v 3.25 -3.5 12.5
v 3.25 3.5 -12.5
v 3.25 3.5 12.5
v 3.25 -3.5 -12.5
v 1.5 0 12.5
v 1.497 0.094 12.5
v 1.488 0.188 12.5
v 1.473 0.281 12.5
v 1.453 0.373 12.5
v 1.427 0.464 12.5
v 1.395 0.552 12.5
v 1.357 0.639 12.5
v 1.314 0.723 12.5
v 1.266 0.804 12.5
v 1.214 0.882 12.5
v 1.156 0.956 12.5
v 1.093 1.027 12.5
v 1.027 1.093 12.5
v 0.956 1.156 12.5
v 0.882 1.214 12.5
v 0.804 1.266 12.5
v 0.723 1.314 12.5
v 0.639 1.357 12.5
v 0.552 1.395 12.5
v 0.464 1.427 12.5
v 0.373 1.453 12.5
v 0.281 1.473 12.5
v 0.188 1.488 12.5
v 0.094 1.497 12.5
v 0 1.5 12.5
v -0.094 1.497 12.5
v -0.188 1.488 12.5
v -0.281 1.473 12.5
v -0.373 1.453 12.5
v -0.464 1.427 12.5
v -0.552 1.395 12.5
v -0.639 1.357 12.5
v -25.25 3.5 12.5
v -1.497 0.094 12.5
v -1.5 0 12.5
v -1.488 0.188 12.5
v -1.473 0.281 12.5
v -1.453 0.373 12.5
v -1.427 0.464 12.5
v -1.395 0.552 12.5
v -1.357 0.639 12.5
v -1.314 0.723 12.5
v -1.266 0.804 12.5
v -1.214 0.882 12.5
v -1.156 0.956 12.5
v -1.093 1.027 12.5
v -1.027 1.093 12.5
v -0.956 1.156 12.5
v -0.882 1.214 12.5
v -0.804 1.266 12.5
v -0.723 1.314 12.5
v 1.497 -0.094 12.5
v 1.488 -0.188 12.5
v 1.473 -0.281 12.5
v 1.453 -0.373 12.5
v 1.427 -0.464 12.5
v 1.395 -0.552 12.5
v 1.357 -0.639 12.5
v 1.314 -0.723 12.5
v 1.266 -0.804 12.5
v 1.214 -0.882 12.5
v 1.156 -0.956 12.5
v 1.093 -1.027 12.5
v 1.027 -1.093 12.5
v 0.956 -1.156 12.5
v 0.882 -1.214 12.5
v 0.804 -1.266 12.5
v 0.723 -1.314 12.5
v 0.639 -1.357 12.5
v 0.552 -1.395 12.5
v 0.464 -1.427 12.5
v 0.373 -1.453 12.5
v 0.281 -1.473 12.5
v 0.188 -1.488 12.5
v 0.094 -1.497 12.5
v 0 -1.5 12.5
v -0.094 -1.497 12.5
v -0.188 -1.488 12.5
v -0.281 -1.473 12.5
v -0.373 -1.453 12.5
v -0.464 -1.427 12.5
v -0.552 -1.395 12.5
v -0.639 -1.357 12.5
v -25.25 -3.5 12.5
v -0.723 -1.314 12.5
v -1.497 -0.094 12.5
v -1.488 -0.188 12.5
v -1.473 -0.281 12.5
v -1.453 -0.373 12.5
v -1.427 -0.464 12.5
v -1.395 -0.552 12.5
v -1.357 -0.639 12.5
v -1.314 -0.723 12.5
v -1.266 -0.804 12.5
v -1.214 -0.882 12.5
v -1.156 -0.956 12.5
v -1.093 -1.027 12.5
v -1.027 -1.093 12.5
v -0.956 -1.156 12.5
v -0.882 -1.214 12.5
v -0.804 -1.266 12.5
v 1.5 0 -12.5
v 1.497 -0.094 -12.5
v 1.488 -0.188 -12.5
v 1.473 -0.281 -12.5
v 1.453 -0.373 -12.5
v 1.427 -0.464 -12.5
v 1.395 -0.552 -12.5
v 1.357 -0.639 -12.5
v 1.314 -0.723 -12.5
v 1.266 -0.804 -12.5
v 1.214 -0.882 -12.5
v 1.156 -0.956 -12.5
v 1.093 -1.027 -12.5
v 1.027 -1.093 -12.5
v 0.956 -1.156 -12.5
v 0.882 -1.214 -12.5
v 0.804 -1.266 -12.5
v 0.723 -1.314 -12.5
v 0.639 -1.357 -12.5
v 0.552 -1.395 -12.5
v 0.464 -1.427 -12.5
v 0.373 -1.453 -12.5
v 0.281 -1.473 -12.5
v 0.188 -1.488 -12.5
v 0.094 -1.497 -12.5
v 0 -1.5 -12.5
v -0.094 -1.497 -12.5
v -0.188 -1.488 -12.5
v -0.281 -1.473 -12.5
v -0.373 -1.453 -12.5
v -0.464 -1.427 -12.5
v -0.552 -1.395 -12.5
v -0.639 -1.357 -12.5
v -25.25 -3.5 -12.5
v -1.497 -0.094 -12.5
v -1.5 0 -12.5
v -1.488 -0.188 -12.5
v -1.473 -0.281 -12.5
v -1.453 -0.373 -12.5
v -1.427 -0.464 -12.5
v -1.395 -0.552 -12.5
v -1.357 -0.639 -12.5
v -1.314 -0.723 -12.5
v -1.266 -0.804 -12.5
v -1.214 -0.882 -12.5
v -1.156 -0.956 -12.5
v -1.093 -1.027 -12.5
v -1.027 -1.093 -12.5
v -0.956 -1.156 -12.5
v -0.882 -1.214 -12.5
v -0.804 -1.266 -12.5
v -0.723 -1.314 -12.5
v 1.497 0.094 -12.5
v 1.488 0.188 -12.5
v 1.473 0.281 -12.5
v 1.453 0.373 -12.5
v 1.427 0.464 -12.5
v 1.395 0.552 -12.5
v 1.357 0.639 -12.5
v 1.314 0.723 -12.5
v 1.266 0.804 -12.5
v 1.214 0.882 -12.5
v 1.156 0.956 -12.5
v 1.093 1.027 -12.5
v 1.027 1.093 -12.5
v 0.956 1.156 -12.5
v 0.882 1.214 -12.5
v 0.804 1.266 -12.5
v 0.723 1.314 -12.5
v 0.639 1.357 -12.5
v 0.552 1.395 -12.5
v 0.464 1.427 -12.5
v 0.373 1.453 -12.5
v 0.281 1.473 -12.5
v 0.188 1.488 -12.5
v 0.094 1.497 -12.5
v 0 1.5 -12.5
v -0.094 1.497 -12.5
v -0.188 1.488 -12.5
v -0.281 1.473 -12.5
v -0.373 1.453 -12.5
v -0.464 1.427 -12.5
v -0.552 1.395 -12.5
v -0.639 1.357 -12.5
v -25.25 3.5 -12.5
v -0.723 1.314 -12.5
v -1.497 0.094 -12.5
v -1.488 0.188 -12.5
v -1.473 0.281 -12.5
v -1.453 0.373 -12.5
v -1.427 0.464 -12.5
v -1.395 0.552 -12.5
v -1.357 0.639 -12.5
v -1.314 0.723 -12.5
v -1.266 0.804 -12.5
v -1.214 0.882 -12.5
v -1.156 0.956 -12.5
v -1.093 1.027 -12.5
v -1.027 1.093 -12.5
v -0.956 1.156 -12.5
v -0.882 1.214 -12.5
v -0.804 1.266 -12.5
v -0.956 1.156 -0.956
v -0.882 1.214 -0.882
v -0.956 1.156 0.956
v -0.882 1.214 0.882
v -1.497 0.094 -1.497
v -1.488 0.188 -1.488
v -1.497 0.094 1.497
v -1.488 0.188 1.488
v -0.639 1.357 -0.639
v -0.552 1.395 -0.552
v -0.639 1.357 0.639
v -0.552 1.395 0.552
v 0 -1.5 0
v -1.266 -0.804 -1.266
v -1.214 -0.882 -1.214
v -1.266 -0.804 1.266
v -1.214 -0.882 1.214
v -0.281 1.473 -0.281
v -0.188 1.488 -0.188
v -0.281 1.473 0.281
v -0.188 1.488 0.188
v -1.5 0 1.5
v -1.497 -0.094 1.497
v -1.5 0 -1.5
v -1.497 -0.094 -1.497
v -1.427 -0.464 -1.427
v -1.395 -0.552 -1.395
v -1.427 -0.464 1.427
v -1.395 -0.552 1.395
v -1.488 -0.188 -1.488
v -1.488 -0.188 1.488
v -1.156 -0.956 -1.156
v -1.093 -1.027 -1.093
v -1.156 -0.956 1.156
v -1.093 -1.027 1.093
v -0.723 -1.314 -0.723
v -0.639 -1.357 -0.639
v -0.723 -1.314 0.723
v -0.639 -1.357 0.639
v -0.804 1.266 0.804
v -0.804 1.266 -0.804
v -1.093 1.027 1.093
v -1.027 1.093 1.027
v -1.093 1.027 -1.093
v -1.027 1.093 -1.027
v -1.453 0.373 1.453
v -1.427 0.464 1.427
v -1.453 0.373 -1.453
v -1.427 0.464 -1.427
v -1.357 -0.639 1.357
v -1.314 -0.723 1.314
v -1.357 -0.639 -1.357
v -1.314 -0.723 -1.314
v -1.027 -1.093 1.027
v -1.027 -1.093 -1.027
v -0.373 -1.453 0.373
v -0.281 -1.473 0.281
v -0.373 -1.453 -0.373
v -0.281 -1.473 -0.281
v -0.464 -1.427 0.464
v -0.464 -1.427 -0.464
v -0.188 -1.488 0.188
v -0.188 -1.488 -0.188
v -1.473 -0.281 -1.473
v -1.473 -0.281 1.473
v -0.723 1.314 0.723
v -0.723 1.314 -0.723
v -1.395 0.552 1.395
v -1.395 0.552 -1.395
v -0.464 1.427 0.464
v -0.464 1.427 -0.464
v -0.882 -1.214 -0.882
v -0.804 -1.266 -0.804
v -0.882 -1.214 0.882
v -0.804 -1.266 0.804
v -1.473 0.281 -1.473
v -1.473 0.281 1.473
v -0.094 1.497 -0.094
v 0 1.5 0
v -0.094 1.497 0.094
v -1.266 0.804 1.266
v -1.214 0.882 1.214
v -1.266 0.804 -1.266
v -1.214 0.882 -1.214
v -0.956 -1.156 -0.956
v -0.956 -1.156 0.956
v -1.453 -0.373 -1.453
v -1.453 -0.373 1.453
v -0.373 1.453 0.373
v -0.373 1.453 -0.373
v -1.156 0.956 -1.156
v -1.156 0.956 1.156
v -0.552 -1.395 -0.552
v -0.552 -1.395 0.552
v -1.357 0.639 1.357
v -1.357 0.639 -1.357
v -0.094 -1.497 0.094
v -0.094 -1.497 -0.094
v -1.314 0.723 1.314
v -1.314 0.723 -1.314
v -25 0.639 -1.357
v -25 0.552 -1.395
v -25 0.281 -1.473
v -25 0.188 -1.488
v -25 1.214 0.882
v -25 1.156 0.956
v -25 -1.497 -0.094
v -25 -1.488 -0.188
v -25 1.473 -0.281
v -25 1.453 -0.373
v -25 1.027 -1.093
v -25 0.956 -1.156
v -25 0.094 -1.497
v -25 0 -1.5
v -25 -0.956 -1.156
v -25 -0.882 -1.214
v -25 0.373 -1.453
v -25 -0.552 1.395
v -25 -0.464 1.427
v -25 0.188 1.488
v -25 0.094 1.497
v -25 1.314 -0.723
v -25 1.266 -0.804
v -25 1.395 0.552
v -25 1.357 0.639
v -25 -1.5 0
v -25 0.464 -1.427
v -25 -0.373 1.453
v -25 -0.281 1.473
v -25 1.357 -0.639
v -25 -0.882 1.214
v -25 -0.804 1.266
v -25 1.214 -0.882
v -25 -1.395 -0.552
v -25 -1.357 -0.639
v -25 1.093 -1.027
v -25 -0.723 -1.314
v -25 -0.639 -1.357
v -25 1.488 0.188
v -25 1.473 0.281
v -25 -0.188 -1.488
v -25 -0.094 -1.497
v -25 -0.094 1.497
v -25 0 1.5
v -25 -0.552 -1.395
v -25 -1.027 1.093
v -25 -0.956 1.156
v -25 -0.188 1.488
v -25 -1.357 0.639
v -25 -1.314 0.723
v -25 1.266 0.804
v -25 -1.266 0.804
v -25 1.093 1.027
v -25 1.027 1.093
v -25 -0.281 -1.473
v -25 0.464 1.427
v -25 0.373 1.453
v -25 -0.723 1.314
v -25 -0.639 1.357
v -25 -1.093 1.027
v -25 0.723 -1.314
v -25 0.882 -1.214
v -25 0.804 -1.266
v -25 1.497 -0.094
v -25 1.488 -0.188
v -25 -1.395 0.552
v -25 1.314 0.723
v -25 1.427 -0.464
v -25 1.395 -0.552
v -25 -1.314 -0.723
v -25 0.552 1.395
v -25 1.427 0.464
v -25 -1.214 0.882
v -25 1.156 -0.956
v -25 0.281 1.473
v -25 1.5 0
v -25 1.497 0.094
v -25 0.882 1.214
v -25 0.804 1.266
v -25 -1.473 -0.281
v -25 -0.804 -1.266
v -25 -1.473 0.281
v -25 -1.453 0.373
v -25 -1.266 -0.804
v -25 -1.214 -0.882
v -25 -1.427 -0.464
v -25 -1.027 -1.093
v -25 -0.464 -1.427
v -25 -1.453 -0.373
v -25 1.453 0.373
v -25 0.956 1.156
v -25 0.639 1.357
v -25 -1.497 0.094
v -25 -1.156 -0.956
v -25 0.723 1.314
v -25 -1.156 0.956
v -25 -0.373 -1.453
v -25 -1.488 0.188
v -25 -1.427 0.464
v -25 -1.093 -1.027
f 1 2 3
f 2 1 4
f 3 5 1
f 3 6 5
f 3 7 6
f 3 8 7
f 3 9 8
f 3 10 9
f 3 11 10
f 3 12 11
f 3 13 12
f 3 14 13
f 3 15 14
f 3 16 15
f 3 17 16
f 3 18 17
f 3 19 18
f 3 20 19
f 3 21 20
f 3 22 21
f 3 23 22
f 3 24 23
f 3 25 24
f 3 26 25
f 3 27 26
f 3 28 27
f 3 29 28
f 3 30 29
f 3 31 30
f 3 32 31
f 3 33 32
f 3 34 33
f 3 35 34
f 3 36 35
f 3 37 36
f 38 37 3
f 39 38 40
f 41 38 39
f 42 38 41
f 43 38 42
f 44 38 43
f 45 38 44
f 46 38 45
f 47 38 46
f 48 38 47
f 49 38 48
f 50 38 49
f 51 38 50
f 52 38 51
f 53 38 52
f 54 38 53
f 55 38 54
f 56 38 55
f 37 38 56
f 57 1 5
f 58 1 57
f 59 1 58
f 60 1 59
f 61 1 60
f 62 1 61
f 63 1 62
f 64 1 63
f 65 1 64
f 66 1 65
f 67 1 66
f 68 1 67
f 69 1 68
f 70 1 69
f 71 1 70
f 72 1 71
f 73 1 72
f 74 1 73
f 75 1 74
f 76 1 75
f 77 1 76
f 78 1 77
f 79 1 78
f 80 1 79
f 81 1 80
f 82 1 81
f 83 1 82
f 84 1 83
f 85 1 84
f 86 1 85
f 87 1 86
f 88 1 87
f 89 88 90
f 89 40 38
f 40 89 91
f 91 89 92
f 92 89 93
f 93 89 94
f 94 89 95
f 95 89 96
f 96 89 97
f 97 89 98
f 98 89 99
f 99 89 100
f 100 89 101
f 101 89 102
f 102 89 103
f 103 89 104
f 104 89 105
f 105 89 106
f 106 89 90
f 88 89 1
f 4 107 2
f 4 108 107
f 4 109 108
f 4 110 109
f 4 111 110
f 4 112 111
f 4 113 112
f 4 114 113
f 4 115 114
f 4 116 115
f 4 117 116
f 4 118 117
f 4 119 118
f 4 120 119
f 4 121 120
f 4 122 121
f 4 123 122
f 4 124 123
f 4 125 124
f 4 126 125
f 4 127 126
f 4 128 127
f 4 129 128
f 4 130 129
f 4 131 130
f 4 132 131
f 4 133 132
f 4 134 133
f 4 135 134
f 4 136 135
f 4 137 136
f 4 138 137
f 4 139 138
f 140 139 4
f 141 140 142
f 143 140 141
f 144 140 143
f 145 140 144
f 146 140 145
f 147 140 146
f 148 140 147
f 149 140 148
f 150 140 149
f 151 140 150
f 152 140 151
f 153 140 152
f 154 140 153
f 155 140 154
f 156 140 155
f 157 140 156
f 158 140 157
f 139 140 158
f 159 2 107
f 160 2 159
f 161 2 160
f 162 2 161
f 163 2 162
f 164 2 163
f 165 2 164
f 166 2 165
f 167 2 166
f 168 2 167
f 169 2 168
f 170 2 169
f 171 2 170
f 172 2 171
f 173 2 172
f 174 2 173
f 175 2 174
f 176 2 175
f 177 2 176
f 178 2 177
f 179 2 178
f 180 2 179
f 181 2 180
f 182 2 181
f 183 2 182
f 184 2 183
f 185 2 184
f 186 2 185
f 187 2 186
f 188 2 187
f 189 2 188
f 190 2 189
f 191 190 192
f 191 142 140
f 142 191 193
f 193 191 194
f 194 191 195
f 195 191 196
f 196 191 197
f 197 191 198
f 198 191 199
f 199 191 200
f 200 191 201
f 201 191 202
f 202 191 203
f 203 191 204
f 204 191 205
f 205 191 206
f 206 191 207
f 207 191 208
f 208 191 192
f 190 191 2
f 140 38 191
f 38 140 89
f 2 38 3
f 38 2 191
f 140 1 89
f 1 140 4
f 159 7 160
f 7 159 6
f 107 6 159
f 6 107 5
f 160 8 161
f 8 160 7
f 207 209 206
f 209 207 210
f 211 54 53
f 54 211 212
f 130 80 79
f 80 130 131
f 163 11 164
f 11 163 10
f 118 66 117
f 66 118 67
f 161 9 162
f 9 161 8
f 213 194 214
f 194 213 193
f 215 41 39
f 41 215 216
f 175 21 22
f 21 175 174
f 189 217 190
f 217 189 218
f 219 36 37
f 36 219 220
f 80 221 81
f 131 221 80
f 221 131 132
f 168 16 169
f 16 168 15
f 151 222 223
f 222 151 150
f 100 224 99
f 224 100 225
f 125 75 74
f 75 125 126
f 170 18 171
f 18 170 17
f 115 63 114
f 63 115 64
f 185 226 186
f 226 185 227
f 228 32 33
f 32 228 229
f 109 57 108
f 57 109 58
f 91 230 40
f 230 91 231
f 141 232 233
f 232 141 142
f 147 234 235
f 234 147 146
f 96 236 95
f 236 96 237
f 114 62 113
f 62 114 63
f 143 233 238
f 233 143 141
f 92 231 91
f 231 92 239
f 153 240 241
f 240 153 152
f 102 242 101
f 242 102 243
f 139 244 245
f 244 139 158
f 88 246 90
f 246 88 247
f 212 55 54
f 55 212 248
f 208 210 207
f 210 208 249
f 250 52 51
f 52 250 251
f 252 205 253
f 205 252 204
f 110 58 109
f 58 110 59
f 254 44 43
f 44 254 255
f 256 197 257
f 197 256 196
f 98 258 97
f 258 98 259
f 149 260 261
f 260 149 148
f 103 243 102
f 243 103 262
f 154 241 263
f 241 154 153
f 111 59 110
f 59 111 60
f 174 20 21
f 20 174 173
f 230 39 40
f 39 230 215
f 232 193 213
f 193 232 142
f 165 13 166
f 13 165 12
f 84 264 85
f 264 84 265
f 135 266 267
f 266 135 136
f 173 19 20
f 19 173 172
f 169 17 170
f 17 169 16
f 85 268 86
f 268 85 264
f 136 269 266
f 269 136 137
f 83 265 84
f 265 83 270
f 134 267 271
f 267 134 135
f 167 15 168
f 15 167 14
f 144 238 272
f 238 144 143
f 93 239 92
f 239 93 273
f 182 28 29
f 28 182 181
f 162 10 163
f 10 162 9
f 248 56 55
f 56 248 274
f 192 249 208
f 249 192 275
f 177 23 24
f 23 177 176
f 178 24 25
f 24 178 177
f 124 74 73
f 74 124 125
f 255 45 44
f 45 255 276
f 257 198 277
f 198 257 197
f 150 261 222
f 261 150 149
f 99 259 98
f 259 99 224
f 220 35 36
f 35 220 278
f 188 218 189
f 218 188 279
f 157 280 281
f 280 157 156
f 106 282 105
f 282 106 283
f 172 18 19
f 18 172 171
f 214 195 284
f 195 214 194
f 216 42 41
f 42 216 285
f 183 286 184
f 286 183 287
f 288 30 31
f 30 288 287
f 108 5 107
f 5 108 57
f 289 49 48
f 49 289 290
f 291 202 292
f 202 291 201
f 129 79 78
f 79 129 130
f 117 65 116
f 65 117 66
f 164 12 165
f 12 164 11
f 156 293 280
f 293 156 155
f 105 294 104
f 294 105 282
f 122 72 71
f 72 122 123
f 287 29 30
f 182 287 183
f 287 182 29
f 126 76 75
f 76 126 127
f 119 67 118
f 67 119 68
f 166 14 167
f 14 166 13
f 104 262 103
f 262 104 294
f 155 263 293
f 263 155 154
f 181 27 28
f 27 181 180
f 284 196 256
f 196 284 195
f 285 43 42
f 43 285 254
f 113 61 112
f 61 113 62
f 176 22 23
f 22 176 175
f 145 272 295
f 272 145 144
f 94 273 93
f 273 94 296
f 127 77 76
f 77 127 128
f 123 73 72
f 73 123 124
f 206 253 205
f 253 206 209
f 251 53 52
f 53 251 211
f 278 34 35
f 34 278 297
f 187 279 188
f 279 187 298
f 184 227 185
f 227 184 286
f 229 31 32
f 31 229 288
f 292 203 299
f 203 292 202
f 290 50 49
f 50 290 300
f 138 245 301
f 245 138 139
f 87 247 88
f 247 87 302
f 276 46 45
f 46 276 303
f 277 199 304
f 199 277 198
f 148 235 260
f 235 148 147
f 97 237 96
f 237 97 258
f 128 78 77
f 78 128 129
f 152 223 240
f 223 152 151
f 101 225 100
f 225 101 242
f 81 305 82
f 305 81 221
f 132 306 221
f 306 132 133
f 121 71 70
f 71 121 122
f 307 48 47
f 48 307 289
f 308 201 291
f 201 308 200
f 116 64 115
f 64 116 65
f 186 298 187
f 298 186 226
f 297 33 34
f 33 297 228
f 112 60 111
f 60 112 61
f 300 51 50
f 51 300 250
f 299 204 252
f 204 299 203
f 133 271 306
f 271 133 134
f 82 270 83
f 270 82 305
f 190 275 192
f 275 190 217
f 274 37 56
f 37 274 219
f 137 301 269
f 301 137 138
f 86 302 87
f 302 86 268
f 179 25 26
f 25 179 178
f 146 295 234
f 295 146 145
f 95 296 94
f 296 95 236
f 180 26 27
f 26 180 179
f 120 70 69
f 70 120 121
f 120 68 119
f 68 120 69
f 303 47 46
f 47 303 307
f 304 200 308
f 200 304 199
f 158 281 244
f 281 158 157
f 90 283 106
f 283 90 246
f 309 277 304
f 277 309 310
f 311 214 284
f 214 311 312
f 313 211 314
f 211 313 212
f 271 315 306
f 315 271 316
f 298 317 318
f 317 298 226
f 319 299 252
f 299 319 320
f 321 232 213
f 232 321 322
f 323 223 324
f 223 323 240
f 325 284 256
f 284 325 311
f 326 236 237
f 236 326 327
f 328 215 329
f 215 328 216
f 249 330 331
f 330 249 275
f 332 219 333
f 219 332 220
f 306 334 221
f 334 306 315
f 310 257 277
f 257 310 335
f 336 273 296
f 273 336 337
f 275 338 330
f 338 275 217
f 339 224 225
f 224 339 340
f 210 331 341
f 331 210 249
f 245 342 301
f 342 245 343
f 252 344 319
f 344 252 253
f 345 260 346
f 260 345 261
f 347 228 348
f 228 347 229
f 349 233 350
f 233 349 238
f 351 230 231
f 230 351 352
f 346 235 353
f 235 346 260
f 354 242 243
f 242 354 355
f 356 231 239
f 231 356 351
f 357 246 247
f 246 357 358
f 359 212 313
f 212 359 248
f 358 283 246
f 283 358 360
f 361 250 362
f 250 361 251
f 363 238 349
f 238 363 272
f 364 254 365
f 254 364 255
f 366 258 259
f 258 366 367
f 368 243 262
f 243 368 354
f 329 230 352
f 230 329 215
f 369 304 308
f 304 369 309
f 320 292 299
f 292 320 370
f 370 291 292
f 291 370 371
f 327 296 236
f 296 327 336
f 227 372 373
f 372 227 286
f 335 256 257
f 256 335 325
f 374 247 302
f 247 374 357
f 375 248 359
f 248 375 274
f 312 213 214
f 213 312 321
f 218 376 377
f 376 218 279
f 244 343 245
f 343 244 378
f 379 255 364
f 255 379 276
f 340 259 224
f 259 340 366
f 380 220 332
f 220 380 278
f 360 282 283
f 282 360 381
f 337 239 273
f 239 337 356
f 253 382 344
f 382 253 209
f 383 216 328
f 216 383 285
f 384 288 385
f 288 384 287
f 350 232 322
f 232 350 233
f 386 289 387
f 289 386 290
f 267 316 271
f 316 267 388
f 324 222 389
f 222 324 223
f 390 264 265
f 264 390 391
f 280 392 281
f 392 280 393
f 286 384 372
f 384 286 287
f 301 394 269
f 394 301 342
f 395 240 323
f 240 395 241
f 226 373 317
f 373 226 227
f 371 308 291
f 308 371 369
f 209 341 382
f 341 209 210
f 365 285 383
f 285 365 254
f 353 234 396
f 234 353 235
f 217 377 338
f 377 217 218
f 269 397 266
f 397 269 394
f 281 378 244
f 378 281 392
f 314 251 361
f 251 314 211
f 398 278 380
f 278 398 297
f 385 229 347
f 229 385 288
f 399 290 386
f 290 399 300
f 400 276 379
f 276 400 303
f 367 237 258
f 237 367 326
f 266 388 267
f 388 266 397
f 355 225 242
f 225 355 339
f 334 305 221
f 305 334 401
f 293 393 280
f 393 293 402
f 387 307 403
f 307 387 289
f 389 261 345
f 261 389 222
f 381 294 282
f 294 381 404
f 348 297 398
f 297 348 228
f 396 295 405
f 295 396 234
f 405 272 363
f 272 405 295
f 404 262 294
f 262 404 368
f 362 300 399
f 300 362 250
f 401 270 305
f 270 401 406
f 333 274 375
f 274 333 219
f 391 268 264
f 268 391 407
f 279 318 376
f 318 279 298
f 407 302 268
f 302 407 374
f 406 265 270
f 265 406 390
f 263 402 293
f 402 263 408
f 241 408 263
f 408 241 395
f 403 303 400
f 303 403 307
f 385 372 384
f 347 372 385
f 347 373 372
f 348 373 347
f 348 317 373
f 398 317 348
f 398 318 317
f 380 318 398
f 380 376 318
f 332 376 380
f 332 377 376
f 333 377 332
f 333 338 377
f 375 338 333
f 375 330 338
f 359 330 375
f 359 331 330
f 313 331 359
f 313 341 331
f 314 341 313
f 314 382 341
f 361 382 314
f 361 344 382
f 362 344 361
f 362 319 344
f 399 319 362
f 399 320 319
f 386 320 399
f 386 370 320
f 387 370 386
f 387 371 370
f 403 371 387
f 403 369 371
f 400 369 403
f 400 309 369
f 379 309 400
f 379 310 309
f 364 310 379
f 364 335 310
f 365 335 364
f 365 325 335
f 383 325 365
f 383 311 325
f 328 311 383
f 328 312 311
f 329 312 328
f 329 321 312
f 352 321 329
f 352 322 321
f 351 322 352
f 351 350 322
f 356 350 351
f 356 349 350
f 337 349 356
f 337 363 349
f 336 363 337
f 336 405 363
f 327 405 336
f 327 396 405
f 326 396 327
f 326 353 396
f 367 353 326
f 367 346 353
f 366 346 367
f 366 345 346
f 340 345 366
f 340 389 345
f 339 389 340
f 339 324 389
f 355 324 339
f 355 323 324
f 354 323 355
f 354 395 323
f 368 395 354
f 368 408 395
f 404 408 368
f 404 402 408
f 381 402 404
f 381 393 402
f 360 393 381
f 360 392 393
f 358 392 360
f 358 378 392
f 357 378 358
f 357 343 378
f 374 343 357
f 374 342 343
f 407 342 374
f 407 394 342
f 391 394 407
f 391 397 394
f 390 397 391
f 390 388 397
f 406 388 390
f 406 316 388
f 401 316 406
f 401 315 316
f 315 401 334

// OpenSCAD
/* 
	Supplemental T-Junction 13

*/

$fn = 100;  // Increase the resolution of the cylinders
pipe_radius = 1.5;
pipe_length = 25;

// Define the cube dimensions
cube_size = [pipe_length + pipe_radius + 2, 2*pipe_radius + 4, pipe_length];

difference() {
    // Create the cube, shifted in the positive x direction
    translate([-pipe_length/2 + pipe_radius, 0, 0])
    cube(cube_size, center=true);

    // Subtract the x-axis pipe
    translate([0, 0, 0])
    cylinder(h=pipe_length, r=pipe_radius, center=true);

    // Subtract the y-axis pipe
    rotate([0, 90, 0])
    translate([0, 0, -pipe_length/2])
    cylinder(h=pipe_length, r=pipe_radius, center=true);
}
